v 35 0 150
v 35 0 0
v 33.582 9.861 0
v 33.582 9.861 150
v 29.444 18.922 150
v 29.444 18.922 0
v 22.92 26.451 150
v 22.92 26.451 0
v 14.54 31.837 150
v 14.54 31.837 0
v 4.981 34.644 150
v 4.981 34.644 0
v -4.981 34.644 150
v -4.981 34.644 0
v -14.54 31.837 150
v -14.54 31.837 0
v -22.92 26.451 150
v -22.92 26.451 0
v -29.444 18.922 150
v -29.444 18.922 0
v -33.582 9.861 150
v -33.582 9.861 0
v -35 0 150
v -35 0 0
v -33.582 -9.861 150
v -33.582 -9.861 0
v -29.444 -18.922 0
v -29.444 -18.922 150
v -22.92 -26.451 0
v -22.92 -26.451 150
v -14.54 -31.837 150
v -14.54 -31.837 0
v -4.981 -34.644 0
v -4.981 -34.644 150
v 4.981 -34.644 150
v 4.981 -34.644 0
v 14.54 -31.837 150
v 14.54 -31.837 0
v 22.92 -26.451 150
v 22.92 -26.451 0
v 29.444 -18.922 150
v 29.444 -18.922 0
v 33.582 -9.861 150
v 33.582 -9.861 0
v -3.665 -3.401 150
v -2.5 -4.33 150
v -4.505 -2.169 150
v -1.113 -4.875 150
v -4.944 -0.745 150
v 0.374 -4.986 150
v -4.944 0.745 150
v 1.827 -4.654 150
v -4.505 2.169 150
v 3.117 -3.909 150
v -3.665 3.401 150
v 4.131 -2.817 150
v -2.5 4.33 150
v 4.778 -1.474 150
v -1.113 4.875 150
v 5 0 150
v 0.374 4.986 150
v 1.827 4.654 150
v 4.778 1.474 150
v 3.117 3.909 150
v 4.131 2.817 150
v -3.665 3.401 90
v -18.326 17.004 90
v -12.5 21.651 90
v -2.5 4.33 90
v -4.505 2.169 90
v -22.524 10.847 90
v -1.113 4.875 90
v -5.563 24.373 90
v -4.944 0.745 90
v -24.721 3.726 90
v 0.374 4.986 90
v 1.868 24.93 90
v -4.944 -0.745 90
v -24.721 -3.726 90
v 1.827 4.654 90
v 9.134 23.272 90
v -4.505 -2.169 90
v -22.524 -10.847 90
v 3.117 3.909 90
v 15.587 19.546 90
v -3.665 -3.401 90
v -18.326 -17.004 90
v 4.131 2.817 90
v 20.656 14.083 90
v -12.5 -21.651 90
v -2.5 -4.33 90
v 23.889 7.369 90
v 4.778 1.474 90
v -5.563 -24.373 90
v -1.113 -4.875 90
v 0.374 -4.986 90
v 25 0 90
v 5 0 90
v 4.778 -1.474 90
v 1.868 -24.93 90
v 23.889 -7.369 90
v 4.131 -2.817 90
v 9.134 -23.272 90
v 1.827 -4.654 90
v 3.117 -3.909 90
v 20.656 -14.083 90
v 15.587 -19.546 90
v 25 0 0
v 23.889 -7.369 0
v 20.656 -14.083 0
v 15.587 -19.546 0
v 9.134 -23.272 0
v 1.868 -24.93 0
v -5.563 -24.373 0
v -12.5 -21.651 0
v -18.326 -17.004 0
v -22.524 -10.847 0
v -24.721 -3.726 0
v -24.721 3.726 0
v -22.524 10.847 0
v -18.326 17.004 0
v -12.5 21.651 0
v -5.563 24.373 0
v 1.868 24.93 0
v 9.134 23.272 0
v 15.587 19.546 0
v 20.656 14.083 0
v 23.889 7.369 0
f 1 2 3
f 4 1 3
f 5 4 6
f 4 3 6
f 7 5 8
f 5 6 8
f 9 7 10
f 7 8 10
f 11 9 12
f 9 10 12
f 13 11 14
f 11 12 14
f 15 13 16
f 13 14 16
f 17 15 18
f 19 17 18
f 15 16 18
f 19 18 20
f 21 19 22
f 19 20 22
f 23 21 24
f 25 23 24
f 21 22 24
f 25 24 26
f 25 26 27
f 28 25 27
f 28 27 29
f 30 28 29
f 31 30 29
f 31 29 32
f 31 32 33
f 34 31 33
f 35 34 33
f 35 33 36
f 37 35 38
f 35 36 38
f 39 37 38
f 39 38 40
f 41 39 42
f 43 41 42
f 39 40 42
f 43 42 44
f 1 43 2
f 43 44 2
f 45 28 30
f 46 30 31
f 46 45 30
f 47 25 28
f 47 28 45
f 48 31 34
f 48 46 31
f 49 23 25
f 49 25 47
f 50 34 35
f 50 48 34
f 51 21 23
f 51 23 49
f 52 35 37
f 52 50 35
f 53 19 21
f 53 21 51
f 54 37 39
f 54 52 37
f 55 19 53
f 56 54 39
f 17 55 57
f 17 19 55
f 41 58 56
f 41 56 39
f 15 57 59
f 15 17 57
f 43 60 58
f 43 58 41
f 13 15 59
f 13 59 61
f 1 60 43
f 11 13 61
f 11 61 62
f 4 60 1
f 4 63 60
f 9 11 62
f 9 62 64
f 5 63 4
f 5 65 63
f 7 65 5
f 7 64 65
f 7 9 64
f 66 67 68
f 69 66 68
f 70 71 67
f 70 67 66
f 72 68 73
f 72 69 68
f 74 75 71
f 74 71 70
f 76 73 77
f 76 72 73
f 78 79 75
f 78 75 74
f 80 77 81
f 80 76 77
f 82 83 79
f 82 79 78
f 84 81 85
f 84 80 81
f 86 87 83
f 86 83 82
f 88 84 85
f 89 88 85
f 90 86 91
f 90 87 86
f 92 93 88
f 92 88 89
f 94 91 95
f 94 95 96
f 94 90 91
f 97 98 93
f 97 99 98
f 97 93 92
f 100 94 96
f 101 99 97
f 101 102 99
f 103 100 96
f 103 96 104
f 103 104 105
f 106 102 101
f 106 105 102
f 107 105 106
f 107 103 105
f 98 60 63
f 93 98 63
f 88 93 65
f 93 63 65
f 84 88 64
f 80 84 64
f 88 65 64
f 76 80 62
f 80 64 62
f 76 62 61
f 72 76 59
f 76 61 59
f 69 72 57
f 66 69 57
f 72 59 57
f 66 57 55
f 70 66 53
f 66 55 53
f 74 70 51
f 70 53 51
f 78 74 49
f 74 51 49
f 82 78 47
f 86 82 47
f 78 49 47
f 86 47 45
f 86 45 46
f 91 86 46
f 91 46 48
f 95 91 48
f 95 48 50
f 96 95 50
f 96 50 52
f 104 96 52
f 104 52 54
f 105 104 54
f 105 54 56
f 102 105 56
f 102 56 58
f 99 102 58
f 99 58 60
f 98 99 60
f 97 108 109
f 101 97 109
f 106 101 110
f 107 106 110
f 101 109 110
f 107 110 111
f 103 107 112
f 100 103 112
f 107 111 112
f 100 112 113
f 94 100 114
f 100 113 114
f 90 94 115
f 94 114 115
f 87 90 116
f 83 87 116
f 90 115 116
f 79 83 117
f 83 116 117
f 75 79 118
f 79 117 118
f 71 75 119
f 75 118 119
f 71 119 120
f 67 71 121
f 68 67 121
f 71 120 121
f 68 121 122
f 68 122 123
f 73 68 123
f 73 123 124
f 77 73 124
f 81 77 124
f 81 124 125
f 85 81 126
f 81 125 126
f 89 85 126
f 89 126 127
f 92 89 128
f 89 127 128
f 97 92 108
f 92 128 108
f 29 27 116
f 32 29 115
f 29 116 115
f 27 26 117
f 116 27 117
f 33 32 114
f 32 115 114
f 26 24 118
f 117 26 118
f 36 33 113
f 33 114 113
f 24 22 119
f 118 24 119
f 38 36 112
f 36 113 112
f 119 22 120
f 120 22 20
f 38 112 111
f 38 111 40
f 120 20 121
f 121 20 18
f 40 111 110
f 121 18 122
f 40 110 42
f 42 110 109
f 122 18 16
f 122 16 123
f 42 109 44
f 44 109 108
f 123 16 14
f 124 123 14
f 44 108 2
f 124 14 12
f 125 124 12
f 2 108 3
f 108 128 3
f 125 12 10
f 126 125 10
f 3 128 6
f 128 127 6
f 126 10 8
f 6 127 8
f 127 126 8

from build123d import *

# Parameters (mm, degrees)
F0_R     = 35
F1_DEPTH = 150
F2_R     = 25
F3_DEPTH = 90
F4_R     = 5
F5_DEPTH = 150.001


with BuildPart() as f1:
    # F0 (on Top) → F1 (new body)
    with BuildSketch(Plane.XY):
        Circle(F0_R)
    extrude(amount=F1_DEPTH)

    # F2 (on face) → F3 (cut)
    with BuildSketch(Plane(origin=(0, 0, 0), x_dir=(1, 0, 0), z_dir=(0, 0, -1))):
        Circle(F2_R)
    extrude(amount=-F3_DEPTH, mode=Mode.SUBTRACT)

    # F4 (on face) → F5 (cut, through all)
    with BuildSketch(Plane.XY.offset(150)):
        Circle(F4_R)
    extrude(amount=-F5_DEPTH, mode=Mode.SUBTRACT)


solid = f1.part
